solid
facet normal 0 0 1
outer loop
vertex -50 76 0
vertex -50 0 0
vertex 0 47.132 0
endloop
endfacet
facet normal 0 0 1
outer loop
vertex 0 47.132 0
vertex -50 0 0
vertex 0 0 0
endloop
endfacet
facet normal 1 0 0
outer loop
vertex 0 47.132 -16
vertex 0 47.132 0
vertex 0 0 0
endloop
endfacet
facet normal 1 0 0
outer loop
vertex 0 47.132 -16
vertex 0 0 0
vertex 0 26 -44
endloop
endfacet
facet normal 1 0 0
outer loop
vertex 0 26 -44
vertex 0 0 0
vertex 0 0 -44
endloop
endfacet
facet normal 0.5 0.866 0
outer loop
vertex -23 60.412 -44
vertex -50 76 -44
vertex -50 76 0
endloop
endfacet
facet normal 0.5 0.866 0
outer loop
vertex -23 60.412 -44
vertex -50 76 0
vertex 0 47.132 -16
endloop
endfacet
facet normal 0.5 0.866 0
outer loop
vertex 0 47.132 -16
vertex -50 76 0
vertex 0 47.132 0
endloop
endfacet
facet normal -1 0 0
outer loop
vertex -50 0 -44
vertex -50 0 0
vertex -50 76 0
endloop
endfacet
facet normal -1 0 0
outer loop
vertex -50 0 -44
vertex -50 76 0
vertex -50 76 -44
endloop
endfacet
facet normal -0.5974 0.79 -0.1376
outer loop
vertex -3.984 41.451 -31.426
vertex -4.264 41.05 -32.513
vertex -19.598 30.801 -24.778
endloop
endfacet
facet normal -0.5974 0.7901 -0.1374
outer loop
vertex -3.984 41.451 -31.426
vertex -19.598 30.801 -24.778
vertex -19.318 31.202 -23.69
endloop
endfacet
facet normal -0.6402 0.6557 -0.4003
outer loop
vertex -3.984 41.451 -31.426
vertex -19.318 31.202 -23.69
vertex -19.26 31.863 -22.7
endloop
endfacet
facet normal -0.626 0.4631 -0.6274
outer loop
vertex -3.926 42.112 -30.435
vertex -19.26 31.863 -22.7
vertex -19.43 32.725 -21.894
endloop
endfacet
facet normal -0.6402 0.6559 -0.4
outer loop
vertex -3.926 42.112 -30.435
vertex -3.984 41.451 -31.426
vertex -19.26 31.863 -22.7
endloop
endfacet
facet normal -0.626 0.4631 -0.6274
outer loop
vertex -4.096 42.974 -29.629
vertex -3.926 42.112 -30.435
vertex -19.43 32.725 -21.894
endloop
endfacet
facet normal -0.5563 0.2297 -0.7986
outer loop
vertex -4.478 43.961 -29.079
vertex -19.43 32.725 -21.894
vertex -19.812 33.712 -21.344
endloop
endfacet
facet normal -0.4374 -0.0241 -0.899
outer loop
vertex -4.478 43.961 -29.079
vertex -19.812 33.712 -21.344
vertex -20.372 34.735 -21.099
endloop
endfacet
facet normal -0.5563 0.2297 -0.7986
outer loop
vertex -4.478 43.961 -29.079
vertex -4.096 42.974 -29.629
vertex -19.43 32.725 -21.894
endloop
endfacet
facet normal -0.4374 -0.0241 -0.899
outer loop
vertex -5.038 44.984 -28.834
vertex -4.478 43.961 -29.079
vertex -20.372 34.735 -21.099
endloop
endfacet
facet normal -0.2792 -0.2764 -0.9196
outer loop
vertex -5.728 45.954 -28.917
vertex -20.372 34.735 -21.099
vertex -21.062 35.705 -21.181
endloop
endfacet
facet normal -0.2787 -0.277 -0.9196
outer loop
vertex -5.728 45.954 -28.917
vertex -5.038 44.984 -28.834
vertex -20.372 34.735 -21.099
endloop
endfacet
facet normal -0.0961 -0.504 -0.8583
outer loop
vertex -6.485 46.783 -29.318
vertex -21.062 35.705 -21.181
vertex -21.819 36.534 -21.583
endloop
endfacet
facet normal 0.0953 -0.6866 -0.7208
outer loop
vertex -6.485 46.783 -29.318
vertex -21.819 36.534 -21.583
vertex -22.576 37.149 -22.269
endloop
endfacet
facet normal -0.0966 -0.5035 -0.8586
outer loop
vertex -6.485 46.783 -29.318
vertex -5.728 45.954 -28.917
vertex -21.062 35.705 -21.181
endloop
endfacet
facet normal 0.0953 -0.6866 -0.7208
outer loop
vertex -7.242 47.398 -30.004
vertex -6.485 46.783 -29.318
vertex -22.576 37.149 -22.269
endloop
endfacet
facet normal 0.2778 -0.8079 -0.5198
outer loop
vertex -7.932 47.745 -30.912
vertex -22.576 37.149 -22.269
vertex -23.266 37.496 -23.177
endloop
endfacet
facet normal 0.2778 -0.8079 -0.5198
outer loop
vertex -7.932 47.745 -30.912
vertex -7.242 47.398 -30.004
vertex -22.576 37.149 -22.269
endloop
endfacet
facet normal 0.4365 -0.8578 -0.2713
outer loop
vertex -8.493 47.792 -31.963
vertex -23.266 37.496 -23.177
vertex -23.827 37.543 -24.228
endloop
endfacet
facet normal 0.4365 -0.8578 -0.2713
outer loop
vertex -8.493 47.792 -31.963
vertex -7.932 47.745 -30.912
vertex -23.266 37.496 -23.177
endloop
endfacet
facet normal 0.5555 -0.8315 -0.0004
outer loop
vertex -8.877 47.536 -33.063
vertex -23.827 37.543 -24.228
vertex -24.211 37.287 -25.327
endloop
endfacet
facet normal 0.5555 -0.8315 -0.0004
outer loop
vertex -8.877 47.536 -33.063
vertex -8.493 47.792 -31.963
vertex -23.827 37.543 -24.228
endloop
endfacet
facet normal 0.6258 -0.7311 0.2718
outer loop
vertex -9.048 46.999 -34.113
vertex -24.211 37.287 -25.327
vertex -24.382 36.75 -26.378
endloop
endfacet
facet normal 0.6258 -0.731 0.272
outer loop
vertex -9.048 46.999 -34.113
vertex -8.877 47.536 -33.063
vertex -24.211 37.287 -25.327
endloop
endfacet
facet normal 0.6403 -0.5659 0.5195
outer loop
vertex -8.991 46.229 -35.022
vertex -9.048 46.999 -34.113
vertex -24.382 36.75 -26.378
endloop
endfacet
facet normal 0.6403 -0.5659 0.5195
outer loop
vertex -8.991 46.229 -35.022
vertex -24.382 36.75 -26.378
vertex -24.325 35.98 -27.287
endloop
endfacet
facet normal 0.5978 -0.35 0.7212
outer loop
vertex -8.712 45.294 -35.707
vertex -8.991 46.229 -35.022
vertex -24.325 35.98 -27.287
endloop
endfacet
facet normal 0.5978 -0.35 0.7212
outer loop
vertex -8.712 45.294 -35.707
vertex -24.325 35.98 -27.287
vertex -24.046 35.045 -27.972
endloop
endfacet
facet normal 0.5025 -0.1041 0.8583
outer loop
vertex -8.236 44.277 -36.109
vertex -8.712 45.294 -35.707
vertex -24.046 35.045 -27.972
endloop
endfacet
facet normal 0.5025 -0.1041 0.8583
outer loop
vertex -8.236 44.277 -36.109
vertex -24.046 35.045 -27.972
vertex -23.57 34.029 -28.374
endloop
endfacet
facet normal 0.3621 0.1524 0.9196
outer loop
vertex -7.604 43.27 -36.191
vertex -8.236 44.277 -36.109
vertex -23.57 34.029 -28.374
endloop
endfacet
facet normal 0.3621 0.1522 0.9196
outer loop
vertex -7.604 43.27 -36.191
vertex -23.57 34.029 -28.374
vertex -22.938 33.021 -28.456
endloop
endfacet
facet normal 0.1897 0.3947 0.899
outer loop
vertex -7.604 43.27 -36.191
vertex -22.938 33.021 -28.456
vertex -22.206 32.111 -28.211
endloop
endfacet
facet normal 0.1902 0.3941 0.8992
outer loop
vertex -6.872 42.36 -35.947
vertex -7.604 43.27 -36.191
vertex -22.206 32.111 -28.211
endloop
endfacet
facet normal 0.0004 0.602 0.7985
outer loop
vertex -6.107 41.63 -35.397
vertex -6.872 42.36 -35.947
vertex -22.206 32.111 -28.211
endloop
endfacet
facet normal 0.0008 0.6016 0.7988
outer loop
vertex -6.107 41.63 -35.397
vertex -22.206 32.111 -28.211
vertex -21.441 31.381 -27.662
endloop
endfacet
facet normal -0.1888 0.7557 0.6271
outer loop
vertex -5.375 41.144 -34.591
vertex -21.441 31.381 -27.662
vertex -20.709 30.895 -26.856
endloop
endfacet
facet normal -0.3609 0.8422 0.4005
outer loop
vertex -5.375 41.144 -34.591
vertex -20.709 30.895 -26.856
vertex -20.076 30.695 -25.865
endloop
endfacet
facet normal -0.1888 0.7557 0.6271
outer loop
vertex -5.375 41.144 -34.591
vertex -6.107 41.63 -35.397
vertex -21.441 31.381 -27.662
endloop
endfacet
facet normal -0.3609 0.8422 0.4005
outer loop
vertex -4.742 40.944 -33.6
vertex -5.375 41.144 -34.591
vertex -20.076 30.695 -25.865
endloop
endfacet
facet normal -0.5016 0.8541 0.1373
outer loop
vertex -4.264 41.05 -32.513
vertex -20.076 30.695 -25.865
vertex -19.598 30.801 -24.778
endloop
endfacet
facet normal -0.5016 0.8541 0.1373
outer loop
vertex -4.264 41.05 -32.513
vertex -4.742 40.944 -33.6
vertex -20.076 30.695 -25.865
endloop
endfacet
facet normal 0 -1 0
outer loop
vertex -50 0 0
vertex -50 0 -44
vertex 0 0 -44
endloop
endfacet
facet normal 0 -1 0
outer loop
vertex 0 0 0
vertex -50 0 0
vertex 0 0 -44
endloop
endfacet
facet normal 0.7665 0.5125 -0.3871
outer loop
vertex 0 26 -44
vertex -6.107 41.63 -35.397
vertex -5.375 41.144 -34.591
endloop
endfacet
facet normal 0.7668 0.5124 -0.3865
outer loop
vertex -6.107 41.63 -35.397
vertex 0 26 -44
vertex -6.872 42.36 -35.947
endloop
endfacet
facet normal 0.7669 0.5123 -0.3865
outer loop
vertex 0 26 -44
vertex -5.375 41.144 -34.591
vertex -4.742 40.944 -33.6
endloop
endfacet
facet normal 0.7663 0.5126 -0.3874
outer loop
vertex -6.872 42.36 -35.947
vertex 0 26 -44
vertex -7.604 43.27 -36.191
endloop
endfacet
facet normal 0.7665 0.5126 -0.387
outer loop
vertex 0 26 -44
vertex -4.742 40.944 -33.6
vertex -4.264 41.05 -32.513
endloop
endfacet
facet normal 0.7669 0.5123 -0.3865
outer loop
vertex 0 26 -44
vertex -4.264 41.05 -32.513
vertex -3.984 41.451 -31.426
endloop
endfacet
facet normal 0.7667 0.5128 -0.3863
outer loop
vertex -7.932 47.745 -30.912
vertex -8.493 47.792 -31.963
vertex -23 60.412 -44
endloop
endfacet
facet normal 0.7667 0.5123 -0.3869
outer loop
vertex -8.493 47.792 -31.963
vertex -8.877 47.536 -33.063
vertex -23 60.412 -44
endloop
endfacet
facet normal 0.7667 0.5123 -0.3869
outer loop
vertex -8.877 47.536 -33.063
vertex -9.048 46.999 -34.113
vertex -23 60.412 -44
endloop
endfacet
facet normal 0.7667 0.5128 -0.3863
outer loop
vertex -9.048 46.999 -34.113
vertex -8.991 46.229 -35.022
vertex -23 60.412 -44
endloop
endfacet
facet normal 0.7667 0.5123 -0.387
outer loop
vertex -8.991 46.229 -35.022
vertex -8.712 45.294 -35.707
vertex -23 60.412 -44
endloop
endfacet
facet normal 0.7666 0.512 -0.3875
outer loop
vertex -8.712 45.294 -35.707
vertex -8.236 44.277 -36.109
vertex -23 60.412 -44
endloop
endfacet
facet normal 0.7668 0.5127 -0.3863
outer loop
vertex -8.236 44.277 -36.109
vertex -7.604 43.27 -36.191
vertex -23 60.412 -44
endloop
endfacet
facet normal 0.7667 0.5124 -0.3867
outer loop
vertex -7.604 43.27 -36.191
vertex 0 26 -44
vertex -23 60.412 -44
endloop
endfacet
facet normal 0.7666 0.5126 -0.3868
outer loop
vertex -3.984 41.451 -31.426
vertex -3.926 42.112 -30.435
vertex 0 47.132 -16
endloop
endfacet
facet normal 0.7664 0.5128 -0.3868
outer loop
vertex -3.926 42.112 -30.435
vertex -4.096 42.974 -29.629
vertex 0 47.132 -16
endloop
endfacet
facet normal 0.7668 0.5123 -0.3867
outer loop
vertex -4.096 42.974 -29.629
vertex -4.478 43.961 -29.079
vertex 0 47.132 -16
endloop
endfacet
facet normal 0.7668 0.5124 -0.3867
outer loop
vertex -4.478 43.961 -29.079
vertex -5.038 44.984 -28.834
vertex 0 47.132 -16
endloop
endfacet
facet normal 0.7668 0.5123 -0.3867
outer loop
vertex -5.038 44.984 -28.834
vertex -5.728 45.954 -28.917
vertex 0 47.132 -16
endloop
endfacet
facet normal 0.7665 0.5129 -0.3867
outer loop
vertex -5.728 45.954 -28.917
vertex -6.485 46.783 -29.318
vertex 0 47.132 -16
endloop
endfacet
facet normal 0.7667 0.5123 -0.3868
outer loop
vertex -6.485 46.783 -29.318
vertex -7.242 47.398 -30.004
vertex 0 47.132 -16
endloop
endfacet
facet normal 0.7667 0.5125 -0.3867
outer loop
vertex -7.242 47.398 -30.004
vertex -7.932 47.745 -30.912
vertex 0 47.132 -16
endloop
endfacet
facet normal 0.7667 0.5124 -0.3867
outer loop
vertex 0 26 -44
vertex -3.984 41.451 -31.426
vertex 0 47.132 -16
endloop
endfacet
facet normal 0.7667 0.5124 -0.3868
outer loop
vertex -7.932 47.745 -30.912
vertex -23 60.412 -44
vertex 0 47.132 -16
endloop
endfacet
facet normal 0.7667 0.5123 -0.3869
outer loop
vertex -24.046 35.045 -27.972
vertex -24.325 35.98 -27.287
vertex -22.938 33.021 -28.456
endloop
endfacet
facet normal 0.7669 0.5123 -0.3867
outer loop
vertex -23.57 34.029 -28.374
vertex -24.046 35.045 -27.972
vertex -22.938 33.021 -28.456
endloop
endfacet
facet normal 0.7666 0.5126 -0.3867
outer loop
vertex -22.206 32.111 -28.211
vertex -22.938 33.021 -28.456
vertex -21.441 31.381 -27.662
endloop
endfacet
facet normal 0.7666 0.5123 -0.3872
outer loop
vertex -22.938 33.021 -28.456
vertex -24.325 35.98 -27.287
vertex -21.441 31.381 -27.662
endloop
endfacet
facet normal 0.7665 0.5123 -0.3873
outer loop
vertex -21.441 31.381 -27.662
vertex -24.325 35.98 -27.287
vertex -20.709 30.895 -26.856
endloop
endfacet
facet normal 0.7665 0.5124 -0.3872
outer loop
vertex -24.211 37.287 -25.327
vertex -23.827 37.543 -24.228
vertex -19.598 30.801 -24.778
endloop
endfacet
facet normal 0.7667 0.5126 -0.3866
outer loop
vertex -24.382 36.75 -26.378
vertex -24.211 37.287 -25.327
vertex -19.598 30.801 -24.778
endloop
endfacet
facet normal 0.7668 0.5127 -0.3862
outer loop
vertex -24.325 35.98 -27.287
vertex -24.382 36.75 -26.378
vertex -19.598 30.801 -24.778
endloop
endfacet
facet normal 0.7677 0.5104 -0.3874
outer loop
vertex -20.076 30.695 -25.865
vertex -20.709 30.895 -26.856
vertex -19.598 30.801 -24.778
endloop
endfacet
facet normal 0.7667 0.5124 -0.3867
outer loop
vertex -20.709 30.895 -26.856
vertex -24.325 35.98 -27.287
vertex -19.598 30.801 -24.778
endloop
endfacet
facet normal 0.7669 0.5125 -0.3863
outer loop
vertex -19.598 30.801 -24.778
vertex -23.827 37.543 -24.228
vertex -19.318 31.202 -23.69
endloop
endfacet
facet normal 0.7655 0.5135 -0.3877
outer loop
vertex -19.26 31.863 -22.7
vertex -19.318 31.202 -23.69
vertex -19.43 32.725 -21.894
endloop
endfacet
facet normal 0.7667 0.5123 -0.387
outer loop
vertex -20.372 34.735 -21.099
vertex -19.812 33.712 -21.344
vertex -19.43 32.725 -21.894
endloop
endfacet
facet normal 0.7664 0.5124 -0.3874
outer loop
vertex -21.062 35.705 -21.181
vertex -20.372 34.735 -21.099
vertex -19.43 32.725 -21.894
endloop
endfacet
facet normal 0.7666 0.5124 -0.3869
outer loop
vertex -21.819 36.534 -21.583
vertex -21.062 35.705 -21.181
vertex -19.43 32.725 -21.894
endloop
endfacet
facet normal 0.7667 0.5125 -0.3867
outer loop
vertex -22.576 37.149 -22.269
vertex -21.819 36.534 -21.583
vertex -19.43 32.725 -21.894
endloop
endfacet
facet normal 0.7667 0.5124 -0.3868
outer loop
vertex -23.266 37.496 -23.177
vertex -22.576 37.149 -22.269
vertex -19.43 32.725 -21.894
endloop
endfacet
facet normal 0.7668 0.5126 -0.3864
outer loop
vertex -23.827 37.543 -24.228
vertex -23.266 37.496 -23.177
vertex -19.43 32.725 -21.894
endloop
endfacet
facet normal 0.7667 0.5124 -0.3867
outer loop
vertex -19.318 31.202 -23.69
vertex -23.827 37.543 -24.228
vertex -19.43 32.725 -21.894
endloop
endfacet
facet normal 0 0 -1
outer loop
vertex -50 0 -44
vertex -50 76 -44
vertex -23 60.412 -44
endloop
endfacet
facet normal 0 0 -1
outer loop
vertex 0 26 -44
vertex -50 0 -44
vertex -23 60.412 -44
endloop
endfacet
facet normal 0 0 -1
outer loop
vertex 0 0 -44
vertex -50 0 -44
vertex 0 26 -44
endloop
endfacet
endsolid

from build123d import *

# Parameters (mm, degrees)
SKETCH2_W           = 50
SKETCH2_H           = 44
BOSS_EXTRUDE2_DEPTH = 76
CUT_EXTRUDE1_DEPTH  = 76
CUT_EXTRUDE2_DEPTH  = 76
SKETCH14_R          = 4
CUT_EXTRUDE3_DEPTH  = 20


with BuildPart() as part:
    # Sketch2 → Boss-Extrude2 (new body)
    with BuildSketch(Plane(origin=(0, 0, 0), x_dir=(1, 0, 0), z_dir=(0, 1, 0))):
        with Locations((-25, 22)):
            Rectangle(SKETCH2_W, SKETCH2_H)
    extrude(amount=BOSS_EXTRUDE2_DEPTH)

    # Sketch3 → Cut-Extrude1 (cut)
    with BuildSketch(Plane.XY):
        Polygon((-50, 76), (0, 47.132486541), (0, 76), align=None)
    extrude(amount=-CUT_EXTRUDE1_DEPTH, mode=Mode.SUBTRACT)

    # Sketch10 → Cut-Extrude2 (cut)
    with BuildSketch(Plane(origin=(23.262165395, 15.547974941, -11.734548971), x_dir=(0.3215470193165547, 0.21491571888839583, 0.9221815158326062), z_dir=(-0.7666944497450301, -0.5124435274969221, 0.38675735527159244))):
        Polygon((-4.625392025, 39.185578124), (-34.988178006, 63.006463096), (-34.988178006, 21.61619524), align=None)
    extrude(amount=-CUT_EXTRUDE2_DEPTH, mode=Mode.SUBTRACT)

    # Sketch14 → Cut-Extrude3 (cut)
    with BuildSketch(Plane(origin=(23.262165395, 15.547974941, -11.734548971), x_dir=(0.3215470193165547, 0.21491571888839583, 0.9221815158326062), z_dir=(-0.7666944497450301, -0.5124435274969221, 0.38675735527159244))):
        with Locations(Location((-22.531650424, 40.498325306, 0), (0, 0, 270))):
            Circle(SKETCH14_R)
    extrude(amount=CUT_EXTRUDE3_DEPTH, mode=Mode.SUBTRACT)


solid = part.part
